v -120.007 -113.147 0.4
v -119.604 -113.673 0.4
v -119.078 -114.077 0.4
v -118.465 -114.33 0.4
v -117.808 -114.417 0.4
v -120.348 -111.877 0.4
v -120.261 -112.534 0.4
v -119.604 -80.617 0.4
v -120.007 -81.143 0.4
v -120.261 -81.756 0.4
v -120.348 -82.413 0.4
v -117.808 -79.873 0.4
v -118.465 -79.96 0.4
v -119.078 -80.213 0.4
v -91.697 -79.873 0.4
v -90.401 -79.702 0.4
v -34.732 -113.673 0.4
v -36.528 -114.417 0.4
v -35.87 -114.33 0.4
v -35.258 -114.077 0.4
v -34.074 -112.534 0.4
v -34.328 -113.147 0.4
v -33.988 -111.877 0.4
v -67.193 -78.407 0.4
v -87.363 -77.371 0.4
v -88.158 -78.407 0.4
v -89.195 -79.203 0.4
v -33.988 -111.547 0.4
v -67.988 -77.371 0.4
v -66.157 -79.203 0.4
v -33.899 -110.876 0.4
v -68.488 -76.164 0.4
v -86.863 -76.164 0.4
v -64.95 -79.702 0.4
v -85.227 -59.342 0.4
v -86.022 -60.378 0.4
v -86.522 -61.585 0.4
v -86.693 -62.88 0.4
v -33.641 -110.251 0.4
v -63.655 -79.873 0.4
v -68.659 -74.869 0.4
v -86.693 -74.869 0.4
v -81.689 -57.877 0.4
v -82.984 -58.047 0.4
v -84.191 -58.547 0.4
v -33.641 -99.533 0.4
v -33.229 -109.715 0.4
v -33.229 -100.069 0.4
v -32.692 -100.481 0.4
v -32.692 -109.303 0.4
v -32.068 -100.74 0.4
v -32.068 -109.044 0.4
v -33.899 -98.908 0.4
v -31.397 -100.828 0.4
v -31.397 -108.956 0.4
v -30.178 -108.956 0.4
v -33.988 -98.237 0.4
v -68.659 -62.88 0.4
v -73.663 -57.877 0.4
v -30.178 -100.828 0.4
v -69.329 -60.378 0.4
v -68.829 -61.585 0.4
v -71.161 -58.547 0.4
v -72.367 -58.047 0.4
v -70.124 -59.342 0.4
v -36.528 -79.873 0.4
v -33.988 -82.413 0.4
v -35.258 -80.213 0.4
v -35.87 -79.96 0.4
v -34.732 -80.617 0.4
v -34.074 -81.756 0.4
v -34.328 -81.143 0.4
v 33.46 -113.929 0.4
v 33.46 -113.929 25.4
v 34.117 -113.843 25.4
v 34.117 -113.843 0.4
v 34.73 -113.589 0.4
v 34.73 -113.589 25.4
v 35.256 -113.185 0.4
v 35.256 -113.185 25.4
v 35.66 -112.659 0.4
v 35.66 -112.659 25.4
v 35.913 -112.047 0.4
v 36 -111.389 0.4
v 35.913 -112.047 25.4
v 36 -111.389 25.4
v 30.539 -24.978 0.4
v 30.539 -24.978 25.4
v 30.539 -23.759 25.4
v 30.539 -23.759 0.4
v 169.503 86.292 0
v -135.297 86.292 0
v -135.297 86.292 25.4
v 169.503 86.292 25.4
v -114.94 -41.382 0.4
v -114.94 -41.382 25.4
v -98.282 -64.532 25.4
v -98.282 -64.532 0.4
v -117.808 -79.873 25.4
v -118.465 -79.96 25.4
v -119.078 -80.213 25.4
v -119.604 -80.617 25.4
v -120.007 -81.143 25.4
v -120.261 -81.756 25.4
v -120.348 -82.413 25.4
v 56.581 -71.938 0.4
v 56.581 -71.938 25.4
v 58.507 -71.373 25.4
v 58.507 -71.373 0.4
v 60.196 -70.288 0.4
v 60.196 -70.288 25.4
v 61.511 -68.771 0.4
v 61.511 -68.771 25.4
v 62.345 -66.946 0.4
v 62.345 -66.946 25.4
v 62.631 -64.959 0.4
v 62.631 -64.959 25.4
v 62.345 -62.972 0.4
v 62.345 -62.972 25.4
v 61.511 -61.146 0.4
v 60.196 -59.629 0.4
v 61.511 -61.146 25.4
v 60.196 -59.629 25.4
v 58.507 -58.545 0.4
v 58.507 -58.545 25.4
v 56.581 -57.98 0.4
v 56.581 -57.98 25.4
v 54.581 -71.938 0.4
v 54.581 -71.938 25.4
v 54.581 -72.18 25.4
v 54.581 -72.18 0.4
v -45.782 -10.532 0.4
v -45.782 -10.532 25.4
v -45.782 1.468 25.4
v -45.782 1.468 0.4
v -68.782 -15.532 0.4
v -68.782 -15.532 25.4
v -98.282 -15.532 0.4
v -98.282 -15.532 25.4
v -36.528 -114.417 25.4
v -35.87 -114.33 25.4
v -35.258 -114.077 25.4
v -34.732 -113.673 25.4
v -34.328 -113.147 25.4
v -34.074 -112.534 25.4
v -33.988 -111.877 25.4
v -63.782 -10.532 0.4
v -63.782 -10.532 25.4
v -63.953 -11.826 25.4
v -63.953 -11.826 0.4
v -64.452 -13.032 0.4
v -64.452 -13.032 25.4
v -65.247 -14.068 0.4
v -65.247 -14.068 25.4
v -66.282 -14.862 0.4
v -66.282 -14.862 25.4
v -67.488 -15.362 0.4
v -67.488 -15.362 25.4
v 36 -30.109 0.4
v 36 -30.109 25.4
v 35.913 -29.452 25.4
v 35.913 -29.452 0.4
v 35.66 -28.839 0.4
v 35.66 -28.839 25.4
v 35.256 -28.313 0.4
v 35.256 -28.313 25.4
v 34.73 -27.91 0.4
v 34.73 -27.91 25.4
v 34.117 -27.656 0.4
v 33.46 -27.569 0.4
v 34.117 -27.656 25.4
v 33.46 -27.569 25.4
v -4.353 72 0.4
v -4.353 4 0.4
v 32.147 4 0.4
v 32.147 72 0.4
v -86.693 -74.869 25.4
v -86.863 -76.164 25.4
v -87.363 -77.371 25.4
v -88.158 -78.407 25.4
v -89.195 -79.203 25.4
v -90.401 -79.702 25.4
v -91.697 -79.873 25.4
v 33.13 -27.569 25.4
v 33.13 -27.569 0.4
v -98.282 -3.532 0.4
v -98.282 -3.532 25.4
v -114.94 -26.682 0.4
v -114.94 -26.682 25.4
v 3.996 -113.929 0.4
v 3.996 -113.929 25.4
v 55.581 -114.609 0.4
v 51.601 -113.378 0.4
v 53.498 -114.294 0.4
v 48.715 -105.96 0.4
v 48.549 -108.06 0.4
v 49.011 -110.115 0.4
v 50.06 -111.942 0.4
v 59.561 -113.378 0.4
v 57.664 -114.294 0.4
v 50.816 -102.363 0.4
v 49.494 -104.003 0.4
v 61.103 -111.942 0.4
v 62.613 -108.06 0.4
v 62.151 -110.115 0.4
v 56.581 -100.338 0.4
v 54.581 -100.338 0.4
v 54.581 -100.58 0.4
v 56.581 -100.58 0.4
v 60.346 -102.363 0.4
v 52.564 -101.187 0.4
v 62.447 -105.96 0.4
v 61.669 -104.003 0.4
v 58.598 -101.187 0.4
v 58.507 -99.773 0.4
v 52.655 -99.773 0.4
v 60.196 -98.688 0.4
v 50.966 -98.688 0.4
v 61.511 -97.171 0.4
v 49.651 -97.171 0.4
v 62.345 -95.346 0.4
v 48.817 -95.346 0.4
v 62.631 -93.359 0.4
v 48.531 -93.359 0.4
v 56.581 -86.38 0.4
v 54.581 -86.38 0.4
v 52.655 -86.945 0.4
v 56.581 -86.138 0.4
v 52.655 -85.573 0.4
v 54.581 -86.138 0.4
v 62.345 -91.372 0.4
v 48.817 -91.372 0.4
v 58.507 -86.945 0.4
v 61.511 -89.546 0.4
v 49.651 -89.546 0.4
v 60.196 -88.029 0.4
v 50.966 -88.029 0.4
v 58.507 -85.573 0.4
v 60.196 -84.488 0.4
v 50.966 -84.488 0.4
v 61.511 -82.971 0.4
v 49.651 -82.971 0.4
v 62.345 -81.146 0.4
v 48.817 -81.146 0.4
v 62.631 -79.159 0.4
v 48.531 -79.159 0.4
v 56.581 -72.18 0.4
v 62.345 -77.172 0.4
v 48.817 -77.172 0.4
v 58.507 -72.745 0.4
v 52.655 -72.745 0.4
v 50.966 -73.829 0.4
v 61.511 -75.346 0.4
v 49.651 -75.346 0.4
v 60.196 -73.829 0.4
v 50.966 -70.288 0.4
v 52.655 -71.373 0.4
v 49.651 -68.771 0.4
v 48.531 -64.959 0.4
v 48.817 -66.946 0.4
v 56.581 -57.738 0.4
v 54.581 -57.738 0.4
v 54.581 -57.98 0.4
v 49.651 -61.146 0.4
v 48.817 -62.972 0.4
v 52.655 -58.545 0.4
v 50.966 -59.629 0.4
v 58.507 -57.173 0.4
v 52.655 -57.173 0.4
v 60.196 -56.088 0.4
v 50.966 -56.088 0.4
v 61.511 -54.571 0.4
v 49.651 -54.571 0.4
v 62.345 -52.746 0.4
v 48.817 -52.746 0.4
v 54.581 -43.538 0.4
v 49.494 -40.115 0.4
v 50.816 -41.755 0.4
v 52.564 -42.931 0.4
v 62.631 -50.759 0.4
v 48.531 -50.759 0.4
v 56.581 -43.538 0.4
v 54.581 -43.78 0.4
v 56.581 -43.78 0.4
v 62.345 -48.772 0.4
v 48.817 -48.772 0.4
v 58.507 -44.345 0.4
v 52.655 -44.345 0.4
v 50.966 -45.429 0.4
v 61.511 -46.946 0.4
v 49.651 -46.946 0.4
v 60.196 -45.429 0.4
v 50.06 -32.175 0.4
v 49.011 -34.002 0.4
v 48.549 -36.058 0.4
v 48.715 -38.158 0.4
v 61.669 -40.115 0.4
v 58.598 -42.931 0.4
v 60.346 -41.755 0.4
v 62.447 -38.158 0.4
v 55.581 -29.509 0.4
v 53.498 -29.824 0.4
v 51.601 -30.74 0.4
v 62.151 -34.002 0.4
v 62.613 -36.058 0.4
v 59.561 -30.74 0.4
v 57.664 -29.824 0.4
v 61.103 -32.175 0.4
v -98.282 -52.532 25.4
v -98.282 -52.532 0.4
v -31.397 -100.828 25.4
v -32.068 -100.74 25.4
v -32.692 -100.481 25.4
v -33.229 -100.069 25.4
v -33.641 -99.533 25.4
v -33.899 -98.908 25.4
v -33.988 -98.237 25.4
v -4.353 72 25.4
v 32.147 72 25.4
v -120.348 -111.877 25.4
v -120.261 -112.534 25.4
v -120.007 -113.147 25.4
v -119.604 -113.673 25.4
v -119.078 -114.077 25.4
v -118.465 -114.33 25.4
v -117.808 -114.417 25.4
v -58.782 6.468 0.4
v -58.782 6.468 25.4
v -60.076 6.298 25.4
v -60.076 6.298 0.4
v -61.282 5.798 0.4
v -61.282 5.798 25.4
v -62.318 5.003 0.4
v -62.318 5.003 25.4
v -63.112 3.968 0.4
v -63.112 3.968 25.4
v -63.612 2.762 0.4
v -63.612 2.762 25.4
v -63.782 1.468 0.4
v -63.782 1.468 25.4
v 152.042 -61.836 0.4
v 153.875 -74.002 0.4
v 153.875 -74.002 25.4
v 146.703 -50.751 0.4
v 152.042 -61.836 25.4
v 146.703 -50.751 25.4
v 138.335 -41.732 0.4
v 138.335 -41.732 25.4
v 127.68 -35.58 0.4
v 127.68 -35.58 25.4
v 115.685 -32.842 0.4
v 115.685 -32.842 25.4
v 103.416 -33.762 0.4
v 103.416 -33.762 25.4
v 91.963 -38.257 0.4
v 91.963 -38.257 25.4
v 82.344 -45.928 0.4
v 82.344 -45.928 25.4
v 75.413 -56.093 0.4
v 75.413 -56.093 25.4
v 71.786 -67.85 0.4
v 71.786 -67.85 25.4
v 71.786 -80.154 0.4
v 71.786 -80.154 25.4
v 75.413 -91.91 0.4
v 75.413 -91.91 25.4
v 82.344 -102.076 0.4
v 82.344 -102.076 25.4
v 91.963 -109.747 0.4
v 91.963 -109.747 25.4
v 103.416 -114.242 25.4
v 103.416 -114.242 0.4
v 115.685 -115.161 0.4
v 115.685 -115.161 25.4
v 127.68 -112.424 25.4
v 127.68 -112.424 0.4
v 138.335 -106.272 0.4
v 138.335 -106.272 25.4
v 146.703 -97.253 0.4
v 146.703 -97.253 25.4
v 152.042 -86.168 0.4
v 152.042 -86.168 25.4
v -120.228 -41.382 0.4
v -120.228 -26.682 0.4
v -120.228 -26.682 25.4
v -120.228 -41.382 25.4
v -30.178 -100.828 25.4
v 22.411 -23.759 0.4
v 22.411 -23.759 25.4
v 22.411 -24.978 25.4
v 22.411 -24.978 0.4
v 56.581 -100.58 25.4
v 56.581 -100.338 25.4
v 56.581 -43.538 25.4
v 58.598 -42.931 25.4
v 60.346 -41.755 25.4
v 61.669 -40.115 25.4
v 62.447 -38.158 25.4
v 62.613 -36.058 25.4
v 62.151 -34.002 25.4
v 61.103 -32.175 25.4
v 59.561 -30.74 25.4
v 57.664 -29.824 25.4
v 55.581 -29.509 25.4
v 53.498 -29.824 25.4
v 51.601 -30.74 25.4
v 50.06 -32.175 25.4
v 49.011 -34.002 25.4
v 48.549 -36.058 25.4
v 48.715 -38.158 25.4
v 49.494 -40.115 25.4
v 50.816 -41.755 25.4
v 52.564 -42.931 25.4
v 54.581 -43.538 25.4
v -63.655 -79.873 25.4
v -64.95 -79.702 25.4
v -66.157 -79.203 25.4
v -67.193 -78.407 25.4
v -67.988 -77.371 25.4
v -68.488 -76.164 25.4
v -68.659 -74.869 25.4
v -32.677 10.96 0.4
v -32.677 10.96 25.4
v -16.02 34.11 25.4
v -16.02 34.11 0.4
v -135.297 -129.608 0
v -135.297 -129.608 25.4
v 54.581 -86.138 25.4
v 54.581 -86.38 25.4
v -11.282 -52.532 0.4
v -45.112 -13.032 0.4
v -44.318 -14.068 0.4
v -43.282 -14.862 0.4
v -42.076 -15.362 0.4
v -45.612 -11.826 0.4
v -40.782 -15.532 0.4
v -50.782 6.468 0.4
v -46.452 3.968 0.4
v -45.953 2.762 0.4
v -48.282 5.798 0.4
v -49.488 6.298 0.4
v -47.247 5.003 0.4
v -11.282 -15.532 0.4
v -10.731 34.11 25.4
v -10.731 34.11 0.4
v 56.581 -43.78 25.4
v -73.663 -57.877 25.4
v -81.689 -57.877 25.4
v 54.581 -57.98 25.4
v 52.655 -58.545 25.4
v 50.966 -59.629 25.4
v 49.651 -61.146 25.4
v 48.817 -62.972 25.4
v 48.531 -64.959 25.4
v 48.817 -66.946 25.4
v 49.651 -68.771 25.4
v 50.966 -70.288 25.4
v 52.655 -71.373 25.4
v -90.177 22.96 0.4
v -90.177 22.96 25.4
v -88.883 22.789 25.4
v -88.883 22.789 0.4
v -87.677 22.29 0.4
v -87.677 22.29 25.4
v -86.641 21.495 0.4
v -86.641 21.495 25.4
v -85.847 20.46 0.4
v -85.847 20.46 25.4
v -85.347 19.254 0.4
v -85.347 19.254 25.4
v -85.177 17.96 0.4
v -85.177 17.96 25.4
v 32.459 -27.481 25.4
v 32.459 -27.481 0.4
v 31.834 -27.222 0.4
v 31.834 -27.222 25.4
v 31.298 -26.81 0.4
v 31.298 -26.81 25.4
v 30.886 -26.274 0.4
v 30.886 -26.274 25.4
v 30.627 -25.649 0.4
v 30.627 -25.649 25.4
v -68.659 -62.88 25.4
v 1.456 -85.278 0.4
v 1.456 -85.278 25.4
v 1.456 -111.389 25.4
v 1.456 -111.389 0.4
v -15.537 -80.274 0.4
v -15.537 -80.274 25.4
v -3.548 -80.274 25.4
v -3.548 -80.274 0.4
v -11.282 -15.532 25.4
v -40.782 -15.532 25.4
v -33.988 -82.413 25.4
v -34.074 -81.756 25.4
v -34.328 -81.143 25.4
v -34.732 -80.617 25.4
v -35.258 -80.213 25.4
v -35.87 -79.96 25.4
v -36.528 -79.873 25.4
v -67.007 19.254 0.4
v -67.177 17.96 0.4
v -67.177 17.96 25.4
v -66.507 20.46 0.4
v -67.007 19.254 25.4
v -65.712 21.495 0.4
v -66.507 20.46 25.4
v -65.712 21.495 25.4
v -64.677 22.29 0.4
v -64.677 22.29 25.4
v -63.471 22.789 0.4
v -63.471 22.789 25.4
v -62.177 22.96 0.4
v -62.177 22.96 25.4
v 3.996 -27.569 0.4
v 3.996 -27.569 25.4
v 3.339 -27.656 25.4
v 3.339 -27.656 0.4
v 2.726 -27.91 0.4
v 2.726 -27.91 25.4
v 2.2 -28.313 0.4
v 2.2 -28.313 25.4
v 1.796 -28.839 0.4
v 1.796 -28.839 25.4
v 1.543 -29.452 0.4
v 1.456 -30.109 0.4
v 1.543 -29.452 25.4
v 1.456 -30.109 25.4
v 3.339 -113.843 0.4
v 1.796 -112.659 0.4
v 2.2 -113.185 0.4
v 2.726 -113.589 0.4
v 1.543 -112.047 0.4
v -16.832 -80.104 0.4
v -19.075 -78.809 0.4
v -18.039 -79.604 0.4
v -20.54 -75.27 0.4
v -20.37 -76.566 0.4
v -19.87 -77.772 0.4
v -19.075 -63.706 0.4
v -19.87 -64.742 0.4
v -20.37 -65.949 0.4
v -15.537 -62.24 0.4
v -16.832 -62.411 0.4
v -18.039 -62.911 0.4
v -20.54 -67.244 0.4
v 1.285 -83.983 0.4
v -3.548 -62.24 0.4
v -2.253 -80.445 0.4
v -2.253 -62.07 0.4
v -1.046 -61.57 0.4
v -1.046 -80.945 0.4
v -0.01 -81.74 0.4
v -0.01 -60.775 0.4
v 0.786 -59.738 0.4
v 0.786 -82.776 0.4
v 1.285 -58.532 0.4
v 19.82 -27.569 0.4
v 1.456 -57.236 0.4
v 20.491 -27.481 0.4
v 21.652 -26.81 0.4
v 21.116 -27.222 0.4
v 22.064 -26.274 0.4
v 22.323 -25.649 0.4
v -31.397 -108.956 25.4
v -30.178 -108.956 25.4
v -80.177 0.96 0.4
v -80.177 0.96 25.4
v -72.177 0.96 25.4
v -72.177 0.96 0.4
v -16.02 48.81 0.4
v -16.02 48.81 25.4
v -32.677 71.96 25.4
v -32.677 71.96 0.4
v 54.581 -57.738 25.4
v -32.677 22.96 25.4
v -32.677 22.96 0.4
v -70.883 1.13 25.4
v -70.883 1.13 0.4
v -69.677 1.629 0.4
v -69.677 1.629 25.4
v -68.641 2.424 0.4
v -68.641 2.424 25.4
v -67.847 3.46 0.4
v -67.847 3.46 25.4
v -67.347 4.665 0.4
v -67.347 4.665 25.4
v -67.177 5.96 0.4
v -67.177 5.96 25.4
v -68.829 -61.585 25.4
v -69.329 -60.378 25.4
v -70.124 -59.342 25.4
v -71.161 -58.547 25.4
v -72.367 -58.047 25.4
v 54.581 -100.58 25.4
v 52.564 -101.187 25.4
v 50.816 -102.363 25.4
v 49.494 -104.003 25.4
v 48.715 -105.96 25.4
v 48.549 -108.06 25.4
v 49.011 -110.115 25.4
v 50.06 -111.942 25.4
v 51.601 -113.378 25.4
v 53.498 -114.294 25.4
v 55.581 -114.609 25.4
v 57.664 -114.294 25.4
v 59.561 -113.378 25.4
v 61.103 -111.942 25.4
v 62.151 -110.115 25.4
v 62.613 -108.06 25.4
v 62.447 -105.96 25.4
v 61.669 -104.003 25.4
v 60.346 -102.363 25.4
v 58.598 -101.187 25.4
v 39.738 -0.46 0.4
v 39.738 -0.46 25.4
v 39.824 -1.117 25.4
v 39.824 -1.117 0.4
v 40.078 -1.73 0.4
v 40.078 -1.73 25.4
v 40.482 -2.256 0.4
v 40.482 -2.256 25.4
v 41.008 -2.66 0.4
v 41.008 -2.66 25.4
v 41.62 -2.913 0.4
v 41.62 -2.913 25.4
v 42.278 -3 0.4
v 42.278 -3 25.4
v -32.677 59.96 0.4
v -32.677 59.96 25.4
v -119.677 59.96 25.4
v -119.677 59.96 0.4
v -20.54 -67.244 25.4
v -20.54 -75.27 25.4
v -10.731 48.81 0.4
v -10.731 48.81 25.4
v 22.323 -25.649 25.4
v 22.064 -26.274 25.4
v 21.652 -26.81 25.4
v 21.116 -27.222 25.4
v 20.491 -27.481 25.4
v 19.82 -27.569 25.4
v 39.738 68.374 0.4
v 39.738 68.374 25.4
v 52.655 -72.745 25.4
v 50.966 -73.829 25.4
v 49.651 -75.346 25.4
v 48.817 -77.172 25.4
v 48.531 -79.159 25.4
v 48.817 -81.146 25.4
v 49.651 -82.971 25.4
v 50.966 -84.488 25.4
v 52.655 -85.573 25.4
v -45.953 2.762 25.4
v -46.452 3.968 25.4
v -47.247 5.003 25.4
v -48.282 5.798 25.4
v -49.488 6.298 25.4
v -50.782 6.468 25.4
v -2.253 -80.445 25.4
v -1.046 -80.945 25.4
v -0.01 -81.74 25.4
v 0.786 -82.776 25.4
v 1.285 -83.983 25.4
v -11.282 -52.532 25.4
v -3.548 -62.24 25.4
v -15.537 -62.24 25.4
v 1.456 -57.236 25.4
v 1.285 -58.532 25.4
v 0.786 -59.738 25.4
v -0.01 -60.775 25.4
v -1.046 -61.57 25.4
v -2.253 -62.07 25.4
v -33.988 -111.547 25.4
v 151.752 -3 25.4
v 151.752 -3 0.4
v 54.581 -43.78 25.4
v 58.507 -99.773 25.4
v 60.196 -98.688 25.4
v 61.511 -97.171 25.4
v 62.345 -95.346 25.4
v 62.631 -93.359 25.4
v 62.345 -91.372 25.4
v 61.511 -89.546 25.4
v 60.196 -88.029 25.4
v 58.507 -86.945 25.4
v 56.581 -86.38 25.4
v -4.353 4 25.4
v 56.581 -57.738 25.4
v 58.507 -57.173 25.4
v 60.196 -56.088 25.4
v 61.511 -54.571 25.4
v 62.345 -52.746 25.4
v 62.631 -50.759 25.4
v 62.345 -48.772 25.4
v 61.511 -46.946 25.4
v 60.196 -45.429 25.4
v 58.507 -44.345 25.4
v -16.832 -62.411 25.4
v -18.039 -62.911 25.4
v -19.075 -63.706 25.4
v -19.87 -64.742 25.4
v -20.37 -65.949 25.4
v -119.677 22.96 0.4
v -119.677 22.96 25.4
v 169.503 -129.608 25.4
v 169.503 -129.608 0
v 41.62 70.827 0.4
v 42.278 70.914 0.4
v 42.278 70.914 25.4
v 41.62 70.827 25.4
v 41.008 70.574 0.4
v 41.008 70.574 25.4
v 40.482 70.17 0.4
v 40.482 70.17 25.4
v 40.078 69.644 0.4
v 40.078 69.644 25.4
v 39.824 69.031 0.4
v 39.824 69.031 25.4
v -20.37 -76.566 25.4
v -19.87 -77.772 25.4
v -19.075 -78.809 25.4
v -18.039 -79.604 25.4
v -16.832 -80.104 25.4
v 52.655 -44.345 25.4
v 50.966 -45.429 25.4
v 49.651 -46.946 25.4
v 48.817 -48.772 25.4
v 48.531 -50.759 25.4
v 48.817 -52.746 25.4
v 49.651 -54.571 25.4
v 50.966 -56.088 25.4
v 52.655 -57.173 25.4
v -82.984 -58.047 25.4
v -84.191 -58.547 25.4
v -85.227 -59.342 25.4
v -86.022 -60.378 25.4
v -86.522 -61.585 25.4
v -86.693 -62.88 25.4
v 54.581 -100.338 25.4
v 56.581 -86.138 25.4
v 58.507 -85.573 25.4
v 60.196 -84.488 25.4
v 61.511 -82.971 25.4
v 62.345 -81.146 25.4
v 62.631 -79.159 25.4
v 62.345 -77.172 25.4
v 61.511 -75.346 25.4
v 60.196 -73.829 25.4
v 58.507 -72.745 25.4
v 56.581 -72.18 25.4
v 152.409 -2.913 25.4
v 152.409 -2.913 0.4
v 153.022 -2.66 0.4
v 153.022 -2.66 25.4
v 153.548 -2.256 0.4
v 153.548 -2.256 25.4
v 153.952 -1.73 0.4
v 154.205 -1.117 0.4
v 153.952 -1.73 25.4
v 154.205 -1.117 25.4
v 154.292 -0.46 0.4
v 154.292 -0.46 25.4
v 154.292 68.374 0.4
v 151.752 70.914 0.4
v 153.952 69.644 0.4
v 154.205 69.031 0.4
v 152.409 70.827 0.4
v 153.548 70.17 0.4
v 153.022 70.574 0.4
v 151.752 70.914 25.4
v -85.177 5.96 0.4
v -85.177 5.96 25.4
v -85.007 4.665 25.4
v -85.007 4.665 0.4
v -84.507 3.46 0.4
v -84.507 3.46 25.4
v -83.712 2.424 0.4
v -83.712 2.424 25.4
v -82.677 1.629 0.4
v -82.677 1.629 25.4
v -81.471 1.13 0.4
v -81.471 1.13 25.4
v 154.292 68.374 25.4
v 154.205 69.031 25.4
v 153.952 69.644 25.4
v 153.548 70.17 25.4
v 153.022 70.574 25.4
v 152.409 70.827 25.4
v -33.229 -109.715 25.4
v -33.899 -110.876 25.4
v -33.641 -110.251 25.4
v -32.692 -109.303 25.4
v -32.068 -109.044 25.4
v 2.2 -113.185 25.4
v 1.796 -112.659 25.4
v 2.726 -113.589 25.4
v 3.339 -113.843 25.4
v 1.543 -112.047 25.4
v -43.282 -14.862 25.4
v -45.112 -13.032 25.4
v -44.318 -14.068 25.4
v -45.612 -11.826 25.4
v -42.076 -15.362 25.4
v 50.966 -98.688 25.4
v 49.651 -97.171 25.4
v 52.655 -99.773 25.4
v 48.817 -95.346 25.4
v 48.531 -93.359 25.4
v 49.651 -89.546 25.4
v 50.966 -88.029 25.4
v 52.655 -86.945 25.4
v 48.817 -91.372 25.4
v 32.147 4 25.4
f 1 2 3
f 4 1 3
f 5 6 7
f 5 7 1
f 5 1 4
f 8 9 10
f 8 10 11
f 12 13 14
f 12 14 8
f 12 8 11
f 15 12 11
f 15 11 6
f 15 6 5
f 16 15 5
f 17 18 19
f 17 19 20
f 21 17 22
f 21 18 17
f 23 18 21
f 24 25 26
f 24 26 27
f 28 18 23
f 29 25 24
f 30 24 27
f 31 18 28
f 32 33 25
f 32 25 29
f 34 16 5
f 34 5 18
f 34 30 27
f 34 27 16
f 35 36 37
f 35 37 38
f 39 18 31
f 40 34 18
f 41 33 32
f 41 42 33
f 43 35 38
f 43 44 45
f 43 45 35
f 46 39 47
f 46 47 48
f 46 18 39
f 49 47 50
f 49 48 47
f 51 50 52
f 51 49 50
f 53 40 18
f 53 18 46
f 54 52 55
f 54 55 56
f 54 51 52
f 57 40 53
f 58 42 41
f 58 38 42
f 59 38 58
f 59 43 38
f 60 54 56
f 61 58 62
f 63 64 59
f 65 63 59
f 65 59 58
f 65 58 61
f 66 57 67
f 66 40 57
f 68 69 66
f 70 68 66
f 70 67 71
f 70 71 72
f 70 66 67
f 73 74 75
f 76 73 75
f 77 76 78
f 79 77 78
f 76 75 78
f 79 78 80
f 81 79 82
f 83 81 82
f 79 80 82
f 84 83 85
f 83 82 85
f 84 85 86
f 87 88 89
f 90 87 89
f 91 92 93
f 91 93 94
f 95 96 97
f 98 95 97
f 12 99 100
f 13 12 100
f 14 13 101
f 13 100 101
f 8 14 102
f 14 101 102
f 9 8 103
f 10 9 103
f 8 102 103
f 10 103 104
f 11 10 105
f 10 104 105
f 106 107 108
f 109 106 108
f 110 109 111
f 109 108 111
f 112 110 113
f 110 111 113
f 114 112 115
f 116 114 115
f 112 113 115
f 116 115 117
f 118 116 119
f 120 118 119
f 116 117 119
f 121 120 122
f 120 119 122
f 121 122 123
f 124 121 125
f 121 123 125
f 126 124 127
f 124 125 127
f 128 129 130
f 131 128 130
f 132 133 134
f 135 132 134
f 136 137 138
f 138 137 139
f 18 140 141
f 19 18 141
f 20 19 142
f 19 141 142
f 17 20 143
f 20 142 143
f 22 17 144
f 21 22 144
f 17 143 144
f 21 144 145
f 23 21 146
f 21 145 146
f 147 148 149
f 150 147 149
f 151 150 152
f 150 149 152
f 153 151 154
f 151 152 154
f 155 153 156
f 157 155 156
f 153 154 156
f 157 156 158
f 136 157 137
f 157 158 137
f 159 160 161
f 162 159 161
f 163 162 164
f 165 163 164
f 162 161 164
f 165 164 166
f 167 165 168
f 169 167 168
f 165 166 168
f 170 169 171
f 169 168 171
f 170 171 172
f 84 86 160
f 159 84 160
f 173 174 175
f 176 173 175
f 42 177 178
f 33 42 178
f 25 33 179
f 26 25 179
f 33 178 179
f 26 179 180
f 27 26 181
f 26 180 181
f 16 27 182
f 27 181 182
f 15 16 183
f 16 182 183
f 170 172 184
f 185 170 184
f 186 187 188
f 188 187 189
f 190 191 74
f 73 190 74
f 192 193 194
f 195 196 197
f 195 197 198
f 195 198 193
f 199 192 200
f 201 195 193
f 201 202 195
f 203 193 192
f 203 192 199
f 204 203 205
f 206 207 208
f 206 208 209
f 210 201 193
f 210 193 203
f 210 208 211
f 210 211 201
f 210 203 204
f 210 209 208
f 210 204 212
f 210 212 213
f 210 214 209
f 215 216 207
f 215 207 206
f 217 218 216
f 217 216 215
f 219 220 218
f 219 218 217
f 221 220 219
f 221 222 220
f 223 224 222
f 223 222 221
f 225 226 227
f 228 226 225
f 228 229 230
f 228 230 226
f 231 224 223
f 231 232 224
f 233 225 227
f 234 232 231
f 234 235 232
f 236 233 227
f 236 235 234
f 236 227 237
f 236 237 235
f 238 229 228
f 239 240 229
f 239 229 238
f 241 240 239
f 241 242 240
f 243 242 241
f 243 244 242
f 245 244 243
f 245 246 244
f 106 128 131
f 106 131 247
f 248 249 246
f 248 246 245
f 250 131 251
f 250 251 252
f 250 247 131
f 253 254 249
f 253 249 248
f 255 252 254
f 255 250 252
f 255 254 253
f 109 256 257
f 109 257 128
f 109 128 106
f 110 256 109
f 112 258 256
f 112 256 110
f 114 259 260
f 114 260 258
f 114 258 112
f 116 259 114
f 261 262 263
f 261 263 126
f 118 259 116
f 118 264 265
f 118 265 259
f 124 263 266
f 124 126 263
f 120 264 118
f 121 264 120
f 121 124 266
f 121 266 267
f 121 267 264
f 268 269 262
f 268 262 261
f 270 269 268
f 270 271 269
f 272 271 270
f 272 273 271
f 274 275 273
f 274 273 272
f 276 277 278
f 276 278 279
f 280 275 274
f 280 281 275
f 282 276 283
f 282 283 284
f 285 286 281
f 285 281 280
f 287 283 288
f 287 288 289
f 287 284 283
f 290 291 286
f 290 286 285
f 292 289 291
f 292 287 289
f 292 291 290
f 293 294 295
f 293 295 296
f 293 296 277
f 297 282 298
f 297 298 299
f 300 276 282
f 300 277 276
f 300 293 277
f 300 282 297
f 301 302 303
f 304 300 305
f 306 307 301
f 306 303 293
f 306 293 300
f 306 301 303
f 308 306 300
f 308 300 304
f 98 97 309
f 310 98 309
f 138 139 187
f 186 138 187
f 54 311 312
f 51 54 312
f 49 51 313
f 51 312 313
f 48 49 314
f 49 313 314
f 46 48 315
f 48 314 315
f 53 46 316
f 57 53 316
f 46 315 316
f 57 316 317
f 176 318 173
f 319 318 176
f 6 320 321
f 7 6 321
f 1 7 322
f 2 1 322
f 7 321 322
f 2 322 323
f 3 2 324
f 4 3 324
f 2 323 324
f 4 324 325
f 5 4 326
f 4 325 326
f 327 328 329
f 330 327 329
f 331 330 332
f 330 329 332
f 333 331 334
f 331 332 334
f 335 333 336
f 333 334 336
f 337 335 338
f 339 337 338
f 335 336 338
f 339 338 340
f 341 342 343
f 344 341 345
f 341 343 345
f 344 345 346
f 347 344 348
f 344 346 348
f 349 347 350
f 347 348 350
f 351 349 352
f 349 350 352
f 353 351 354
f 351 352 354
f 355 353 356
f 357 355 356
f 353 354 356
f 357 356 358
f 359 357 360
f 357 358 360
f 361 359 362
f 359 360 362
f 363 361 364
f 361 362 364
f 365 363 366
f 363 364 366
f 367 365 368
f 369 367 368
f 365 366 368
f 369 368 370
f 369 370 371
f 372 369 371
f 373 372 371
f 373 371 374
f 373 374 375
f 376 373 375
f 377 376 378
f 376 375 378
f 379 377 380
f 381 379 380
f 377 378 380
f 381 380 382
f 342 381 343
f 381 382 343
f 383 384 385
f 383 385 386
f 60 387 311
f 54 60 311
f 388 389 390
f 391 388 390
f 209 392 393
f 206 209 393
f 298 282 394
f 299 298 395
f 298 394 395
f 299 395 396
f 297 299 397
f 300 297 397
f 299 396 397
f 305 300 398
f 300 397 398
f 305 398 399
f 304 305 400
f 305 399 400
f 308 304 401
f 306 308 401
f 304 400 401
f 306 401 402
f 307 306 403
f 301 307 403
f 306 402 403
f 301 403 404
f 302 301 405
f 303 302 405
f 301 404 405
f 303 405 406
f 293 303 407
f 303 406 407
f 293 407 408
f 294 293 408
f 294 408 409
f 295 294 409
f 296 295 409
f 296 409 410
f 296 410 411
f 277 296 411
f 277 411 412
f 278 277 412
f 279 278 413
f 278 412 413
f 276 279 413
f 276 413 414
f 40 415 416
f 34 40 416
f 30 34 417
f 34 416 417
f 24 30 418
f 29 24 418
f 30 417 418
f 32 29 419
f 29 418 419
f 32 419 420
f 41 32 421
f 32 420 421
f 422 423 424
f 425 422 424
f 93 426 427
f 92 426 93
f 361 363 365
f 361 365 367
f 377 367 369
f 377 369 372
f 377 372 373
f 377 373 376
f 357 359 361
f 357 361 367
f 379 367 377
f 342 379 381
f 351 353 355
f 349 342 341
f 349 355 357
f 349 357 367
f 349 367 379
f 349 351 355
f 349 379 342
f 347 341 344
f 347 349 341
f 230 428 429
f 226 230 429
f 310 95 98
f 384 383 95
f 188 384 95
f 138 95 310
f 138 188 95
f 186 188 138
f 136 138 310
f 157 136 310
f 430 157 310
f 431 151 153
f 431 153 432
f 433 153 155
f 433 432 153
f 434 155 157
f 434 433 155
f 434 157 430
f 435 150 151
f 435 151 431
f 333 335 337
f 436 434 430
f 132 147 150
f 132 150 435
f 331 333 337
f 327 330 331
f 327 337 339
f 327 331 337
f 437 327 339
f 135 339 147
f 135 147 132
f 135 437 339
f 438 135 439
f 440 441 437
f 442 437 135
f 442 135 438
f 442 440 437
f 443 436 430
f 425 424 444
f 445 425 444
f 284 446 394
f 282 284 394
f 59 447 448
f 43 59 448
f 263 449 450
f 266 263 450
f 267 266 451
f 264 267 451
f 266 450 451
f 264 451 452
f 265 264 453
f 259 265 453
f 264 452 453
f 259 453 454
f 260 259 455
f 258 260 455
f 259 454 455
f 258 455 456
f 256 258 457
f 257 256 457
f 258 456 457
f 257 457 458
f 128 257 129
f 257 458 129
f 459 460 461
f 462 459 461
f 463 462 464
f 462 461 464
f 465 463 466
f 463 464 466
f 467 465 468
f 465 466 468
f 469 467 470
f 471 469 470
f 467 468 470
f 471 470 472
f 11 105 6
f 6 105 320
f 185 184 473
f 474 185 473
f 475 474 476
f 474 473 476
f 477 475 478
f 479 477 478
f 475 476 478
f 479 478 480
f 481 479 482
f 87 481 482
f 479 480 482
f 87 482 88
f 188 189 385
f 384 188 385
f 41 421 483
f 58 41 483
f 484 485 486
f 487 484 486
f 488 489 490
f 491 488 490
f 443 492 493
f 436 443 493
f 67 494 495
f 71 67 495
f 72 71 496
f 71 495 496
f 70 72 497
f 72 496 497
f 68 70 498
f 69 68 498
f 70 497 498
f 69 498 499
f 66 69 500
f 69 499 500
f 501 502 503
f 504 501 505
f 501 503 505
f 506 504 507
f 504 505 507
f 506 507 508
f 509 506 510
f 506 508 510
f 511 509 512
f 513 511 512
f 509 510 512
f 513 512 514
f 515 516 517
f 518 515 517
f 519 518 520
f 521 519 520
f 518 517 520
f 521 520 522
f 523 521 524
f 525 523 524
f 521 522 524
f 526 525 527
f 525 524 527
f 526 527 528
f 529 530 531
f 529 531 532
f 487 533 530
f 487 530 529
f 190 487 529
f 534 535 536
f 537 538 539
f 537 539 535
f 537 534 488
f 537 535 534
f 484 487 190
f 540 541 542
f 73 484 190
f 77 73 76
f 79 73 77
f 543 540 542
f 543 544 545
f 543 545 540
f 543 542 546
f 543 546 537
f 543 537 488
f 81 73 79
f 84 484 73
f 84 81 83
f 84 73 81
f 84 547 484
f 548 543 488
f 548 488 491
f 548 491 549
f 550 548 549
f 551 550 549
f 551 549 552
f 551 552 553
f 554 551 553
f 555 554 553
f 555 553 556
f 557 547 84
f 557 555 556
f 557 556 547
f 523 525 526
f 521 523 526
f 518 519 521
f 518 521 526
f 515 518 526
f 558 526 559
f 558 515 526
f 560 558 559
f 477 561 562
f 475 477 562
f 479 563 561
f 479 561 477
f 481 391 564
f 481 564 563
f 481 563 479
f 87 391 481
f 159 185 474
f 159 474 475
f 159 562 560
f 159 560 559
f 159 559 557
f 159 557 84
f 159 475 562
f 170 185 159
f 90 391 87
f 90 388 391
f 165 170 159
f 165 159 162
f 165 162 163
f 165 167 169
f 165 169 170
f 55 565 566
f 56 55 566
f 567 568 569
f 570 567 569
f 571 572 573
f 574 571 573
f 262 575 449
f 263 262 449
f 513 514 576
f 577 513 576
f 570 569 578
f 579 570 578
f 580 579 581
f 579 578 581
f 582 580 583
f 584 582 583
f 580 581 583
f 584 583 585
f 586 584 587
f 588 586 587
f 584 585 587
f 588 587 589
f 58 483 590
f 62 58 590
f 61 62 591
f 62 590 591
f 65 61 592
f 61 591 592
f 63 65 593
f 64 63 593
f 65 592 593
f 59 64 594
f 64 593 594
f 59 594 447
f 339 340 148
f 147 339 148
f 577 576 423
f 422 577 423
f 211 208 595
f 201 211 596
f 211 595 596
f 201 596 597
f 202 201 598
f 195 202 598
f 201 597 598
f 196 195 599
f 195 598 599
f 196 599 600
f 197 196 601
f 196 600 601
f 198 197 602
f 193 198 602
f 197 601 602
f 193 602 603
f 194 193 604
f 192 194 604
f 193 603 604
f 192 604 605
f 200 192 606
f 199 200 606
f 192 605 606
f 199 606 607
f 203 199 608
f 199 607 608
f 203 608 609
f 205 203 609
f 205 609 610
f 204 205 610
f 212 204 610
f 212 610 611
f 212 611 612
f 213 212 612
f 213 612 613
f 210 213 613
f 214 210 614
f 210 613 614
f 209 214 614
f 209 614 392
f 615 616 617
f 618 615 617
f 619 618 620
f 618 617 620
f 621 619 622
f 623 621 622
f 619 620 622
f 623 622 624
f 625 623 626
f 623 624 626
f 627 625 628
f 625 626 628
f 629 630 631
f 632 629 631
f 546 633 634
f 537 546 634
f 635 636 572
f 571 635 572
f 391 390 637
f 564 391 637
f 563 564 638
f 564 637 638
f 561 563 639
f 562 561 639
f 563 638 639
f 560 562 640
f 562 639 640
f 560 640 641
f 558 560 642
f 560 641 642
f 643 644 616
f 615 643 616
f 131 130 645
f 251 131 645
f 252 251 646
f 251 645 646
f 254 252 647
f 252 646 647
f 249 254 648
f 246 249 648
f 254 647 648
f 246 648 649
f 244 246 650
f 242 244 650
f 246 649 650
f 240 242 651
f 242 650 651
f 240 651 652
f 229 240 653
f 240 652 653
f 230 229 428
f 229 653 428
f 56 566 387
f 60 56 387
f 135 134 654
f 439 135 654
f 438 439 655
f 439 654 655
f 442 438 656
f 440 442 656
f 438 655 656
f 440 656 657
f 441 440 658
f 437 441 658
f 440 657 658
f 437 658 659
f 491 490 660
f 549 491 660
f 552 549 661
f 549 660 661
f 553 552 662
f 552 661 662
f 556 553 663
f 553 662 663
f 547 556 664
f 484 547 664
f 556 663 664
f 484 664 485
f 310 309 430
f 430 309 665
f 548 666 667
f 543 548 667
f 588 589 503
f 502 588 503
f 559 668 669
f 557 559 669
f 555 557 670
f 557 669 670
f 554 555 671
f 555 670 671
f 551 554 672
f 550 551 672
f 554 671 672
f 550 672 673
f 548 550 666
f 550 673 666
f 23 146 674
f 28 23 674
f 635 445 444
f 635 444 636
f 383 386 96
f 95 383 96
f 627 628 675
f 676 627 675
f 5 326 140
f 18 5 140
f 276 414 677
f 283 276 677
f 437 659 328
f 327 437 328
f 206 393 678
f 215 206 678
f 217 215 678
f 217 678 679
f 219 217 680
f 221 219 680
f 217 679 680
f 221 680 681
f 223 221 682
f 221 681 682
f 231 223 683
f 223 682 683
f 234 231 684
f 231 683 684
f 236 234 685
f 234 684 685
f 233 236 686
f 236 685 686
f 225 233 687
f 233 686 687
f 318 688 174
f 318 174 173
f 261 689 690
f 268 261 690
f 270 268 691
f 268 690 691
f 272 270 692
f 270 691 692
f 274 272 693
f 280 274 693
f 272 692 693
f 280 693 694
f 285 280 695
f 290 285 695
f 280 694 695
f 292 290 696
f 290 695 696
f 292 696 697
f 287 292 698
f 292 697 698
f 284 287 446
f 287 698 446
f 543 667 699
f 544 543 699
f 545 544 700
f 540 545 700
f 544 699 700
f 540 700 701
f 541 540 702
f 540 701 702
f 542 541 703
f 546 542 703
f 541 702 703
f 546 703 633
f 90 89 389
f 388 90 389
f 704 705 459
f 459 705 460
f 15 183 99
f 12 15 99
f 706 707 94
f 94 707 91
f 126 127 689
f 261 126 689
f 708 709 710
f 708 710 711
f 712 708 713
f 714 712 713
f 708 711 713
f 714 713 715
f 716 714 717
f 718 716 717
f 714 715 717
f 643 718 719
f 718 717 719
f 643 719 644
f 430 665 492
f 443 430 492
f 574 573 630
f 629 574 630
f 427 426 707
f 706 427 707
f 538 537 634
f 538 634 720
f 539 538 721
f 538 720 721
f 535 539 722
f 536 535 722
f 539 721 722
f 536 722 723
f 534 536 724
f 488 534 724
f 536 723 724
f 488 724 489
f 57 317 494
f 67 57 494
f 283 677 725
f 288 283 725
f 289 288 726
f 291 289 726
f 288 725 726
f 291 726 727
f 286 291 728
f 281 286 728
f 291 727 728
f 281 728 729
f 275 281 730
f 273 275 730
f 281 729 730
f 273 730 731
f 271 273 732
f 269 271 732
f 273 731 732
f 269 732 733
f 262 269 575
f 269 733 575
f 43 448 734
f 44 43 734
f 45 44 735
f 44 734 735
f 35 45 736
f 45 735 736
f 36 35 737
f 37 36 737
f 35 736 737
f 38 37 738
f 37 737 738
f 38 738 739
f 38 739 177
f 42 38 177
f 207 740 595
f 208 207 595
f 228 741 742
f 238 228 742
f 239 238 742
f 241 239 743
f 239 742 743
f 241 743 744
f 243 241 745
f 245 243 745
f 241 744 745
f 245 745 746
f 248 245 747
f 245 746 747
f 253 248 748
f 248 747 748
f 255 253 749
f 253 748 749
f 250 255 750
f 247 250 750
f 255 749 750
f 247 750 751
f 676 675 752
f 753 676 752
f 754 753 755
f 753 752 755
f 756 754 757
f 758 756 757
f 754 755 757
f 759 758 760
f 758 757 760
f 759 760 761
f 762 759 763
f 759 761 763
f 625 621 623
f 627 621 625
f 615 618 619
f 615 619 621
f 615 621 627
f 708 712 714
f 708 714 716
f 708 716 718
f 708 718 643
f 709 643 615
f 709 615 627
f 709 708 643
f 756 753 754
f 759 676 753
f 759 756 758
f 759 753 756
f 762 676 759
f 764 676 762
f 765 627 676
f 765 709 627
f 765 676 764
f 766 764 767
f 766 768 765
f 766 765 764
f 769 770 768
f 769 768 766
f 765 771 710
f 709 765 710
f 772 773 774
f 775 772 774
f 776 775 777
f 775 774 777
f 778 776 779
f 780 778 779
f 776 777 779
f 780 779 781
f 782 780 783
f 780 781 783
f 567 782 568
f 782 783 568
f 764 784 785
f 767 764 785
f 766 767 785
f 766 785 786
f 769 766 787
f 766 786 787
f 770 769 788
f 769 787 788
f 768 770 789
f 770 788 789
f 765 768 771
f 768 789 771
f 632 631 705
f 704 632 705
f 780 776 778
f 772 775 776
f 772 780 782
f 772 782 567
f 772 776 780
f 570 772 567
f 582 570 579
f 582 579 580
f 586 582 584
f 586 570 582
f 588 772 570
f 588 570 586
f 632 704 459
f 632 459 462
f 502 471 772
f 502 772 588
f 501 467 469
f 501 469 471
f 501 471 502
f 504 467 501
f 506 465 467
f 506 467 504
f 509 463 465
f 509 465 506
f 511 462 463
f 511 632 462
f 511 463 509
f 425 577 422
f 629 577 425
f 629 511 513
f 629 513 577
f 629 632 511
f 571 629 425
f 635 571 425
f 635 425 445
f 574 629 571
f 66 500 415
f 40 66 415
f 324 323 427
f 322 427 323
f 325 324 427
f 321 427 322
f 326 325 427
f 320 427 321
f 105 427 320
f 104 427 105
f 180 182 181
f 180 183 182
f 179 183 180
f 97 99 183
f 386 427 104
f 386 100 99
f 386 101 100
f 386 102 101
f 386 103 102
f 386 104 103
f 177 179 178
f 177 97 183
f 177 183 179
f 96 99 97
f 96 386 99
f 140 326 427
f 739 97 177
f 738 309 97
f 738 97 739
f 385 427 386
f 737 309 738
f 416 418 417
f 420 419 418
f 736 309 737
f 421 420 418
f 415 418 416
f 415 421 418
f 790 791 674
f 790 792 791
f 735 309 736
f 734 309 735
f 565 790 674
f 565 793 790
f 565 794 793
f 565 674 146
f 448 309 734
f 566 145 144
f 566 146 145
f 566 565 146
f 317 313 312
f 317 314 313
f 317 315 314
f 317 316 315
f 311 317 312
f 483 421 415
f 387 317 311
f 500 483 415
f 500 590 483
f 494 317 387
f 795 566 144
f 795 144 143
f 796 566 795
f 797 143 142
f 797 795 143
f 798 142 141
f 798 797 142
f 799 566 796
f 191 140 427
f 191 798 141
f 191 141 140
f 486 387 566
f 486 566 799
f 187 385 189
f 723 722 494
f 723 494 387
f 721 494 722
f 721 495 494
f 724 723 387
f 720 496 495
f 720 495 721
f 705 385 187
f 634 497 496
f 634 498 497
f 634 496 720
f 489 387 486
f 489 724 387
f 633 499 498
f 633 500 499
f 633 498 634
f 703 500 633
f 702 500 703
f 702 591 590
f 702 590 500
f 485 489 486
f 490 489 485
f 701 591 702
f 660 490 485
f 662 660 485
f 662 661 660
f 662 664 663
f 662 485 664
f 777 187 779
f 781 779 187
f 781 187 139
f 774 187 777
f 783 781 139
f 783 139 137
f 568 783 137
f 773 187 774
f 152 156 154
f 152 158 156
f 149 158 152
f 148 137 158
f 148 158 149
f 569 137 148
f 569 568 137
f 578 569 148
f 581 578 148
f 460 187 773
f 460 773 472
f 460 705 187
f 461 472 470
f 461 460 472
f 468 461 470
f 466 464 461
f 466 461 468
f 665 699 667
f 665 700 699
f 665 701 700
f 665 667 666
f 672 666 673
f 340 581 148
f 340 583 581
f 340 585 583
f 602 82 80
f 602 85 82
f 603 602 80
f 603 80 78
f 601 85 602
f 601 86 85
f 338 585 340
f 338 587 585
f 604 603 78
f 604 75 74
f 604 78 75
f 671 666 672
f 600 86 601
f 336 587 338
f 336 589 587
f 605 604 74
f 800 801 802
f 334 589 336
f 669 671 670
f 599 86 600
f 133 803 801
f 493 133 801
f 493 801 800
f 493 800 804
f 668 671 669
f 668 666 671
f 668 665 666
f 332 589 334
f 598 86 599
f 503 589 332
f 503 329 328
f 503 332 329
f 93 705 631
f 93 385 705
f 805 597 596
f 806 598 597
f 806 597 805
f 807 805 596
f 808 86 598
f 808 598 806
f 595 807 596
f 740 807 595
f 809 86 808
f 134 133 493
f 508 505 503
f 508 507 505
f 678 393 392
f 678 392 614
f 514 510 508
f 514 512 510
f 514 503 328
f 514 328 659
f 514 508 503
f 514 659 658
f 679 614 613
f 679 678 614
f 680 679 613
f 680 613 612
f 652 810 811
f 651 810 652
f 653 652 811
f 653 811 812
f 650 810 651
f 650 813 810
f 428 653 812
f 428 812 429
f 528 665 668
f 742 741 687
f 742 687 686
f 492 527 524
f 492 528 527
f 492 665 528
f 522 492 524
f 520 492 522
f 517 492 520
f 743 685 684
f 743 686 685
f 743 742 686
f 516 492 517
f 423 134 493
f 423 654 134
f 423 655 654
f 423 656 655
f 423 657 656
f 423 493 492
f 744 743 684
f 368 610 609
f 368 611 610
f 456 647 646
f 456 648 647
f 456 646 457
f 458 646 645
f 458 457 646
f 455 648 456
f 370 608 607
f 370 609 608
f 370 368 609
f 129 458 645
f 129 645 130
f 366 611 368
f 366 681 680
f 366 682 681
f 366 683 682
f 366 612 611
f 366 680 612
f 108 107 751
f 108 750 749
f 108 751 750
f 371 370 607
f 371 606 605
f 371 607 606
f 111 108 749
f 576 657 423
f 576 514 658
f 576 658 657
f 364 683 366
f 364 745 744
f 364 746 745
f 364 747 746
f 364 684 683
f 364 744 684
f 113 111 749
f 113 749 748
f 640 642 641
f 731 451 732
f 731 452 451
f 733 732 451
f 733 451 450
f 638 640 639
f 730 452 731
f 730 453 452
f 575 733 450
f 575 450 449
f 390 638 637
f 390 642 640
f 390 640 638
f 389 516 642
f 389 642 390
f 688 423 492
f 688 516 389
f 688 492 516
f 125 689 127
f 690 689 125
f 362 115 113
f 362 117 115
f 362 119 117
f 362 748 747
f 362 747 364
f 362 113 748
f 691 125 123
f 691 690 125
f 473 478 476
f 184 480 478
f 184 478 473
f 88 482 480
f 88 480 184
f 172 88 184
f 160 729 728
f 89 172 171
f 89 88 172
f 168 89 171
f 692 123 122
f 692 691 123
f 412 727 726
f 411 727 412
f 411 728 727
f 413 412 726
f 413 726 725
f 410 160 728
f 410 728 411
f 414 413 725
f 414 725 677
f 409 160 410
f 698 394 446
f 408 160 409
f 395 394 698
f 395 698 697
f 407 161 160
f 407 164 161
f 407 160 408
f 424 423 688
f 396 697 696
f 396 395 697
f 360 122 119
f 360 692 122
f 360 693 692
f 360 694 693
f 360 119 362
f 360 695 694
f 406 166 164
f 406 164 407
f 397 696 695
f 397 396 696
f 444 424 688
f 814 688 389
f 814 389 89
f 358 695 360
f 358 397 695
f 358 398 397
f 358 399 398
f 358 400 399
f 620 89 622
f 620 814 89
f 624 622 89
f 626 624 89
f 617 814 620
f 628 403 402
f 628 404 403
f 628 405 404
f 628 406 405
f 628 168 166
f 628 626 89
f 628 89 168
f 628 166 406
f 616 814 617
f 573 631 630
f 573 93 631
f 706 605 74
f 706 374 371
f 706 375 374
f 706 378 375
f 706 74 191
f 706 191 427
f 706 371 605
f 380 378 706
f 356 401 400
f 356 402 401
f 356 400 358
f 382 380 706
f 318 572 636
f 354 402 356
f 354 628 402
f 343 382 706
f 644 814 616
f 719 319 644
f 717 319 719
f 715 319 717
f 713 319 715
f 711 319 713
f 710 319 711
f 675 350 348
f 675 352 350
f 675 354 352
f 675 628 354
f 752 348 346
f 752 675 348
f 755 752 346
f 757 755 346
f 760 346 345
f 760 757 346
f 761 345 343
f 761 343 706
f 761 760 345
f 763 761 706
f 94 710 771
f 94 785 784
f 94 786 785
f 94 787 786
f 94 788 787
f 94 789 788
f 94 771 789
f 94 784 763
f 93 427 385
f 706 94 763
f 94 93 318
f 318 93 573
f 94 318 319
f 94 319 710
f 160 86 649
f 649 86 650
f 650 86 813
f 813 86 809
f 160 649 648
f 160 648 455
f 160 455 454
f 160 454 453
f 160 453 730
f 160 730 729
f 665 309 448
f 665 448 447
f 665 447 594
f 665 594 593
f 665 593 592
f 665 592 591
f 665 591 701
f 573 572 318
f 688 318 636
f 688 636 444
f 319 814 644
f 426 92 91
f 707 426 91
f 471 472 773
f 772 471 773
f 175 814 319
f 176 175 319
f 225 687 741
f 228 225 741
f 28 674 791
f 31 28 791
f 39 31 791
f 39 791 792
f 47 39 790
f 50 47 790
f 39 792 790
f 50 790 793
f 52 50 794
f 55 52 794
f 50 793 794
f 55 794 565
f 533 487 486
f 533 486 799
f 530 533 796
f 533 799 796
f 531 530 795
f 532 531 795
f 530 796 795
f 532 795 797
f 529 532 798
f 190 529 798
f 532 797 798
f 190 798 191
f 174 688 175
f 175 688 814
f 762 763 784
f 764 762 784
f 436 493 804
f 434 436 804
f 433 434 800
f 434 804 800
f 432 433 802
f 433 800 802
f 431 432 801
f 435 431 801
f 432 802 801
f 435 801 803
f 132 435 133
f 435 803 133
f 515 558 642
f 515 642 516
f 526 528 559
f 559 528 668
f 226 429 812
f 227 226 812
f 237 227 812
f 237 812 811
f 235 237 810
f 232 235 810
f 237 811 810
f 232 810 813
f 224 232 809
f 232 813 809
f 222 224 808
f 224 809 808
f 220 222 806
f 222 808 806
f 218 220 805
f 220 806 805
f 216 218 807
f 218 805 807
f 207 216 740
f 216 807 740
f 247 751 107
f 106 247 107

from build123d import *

# Parameters (mm, degrees)
F0_W      = 304.8
F0_H      = 215.9
F1_DEPTH  = 25.4
F5_R      = 41.275
F8_W      = 36.5
F8_H      = 68
F10_DEPTH = 25


with BuildPart() as f1:
    # F0 (on Top) → F1 (new body)
    with BuildSketch(Plane.XY):
        with Locations((17.103421, -21.658359)):
            Rectangle(F0_W, F0_H)
    extrude(amount=F1_DEPTH)

    # F0 (on Top) + F2 (on face) + F3 (on face) + F4 (on face) + F5 (on face) + F6 (on face) + F7 (on face) + F8 (on face) + F9 (on face) → F10 (cut)
    with BuildSketch(Plane.XY):
        with Locations((17.103421, -21.658359)):
            Rectangle(F0_W, F0_H)
    with BuildSketch(Plane.XY.offset(25.4)):
        with BuildLine():
            Line((1.455991, -85.278079), (1.455991, -111.389279))
            ThreePointArc((1.455991, -111.389279), (2.19994, -113.18533), (3.995991, -113.929279))
            Line((3.995991, -113.929279), (33.459991, -113.929279))
            ThreePointArc((33.459991, -113.929279), (35.256042, -113.18533), (35.999991, -111.389279))
            Line((35.999991, -111.389279), (35.999991, -30.109279))
            ThreePointArc((35.999991, -30.109279), (35.256042, -28.313228), (33.459991, -27.569279))
            Line((33.459991, -27.569279), (33.129791, -27.569279))
            ThreePointArc((33.129791, -27.569279), (31.297819, -26.810451), (30.538991, -24.978479))
            Line((30.538991, -24.978479), (30.538991, -23.759279))
            Line((30.538991, -23.759279), (22.410991, -23.759279))
            Line((22.410991, -23.759279), (22.410991, -24.978479))
            ThreePointArc((22.410991, -24.978479), (21.652163, -26.810451), (19.820191, -27.569279))
            Line((19.820191, -27.569279), (3.995991, -27.569279))
            ThreePointArc((3.995991, -27.569279), (2.19994, -28.313228), (1.455991, -30.109279))
            Line((1.455991, -30.109279), (1.455991, -57.236479))
            ThreePointArc((1.455991, -57.236479), (-0.009588, -60.7747), (-3.547809, -62.240279))
            Line((-3.547809, -62.240279), (-15.536609, -62.240279))
            ThreePointArc((-15.536609, -62.240279), (-19.07483, -63.705858), (-20.540409, -67.244079))
            Line((-20.540409, -67.244079), (-20.540409, -75.270479))
            ThreePointArc((-20.540409, -75.270479), (-19.07483, -78.8087), (-15.536609, -80.274279))
            Line((-15.536609, -80.274279), (-3.547809, -80.274279))
            ThreePointArc((-3.547809, -80.274279), (-0.009588, -81.739858), (1.455991, -85.278079))
        make_face()
    with BuildSketch(Plane.XY.offset(25.4)):
        with BuildLine():
            Line((-98.282373, -52.532049), (-11.282373, -52.532049))
            Line((-11.282373, -52.532049), (-11.282373, -15.532049))
            Line((-11.282373, -15.532049), (-40.782373, -15.532049))
            ThreePointArc((-40.782373, -15.532049), (-44.317906, -14.067583), (-45.782373, -10.532049))
            Line((-45.782373, -10.532049), (-45.782373, 1.467951))
            ThreePointArc((-45.782373, 1.467951), (-47.246839, 5.003485), (-50.782373, 6.467951))
            Line((-50.782373, 6.467951), (-58.782373, 6.467951))
            ThreePointArc((-58.782373, 6.467951), (-62.317906, 5.003485), (-63.782373, 1.467951))
            Line((-63.782373, 1.467951), (-63.782373, -10.532049))
            ThreePointArc((-63.782373, -10.532049), (-65.246839, -14.067583), (-68.782373, -15.532049))
            Line((-68.782373, -15.532049), (-98.282373, -15.532049))
            Line((-98.282373, -15.532049), (-98.282373, -3.532049))
            Line((-98.282373, -3.532049), (-114.939746, -26.682049))
            Line((-114.939746, -26.682049), (-120.228373, -26.682049))
            Line((-120.228373, -26.682049), (-120.228373, -34.032049))
            Line((-120.228373, -34.032049), (-120.228373, -41.382049))
            Line((-120.228373, -41.382049), (-114.939746, -41.382049))
            Line((-114.939746, -41.382049), (-98.282373, -64.532049))
            Line((-98.282373, -64.532049), (-98.282373, -52.532049))
        make_face()
    with BuildSketch(Plane.XY.offset(25.4)):
        with BuildLine():
            Line((151.751869, 70.914), (42.277869, 70.914))
            ThreePointArc((42.277869, 70.914), (40.481818, 70.170051), (39.737869, 68.374))
            Line((39.737869, 68.374), (39.737869, -0.46))
            ThreePointArc((39.737869, -0.46), (40.481818, -2.256051), (42.277869, -3))
            Line((42.277869, -3), (151.751869, -3))
            ThreePointArc((151.751869, -3), (153.54792, -2.256051), (154.291869, -0.46))
            Line((154.291869, -0.46), (154.291869, 68.374))
            ThreePointArc((154.291869, 68.374), (153.54792, 70.170051), (151.751869, 70.914))
        make_face()
    with BuildSketch(Plane.XY.offset(25.4)):
        with Locations((112.600401, -74.001856)):
            Circle(F5_R)
    with BuildSketch(Plane.XY.offset(25.4)):
        with BuildLine():
            Line((-91.696568, -79.872966), (-117.807768, -79.872966))
            ThreePointArc((-117.807768, -79.872966), (-119.603819, -80.616915), (-120.347768, -82.412966))
            Line((-120.347768, -82.412966), (-120.347768, -111.876966))
            ThreePointArc((-120.347768, -111.876966), (-119.603819, -113.673017), (-117.807768, -114.416966))
            Line((-117.807768, -114.416966), (-36.527768, -114.416966))
            ThreePointArc((-36.527768, -114.416966), (-34.731717, -113.673017), (-33.987768, -111.876966))
            Line((-33.987768, -111.876966), (-33.987768, -111.546766))
            ThreePointArc((-33.987768, -111.546766), (-33.22894, -109.714794), (-31.396968, -108.955966))
            Line((-31.396968, -108.955966), (-30.177768, -108.955966))
            Line((-30.177768, -108.955966), (-30.177768, -100.827966))
            Line((-30.177768, -100.827966), (-31.396968, -100.827966))
            ThreePointArc((-31.396968, -100.827966), (-33.22894, -100.069138), (-33.987768, -98.237166))
            Line((-33.987768, -98.237166), (-33.987768, -82.412966))
            ThreePointArc((-33.987768, -82.412966), (-34.731717, -80.616915), (-36.527768, -79.872966))
            Line((-36.527768, -79.872966), (-63.654968, -79.872966))
            ThreePointArc((-63.654968, -79.872966), (-67.193189, -78.407387), (-68.658768, -74.869166))
            Line((-68.658768, -74.869166), (-68.658768, -62.880366))
            ThreePointArc((-68.658768, -62.880366), (-70.124347, -59.342145), (-73.662568, -57.876566))
            Line((-73.662568, -57.876566), (-81.688968, -57.876566))
            ThreePointArc((-81.688968, -57.876566), (-85.227189, -59.342145), (-86.692768, -62.880366))
            Line((-86.692768, -62.880366), (-86.692768, -74.869166))
            ThreePointArc((-86.692768, -74.869166), (-88.158347, -78.407387), (-91.696568, -79.872966))
        make_face()
    with BuildSketch(Plane.XY.offset(25.4)):
        with BuildLine():
            Line((56.581123, -43.780106), (56.581123, -43.537542))
            ThreePointArc((56.581123, -43.537542), (55.581123, -29.508824), (54.581123, -43.537542))
            Line((54.581123, -43.537542), (54.581123, -43.780106))
            ThreePointArc((54.581123, -43.780106), (48.531123, -50.758824), (54.581123, -57.737542))
            Line((54.581123, -57.737542), (54.581123, -57.980106))
            ThreePointArc((54.581123, -57.980106), (48.531123, -64.958824), (54.581123, -71.937542))
            Line((54.581123, -71.937542), (54.581123, -72.180106))
            ThreePointArc((54.581123, -72.180106), (48.531123, -79.158824), (54.581123, -86.137542))
            Line((54.581123, -86.137542), (54.581123, -86.380106))
            ThreePointArc((54.581123, -86.380106), (48.531123, -93.358824), (54.581123, -100.337542))
            Line((54.581123, -100.337542), (54.581123, -100.580106))
            ThreePointArc((54.581123, -100.580106), (55.581123, -114.608824), (56.581123, -100.580106))
            Line((56.581123, -100.580106), (56.581123, -100.337542))
            ThreePointArc((56.581123, -100.337542), (62.631123, -93.358824), (56.581123, -86.380106))
            Line((56.581123, -86.380106), (56.581123, -86.137542))
            ThreePointArc((56.581123, -86.137542), (62.631123, -79.158824), (56.581123, -72.180106))
            Line((56.581123, -72.180106), (56.581123, -71.937542))
            ThreePointArc((56.581123, -71.937542), (62.631123, -64.958824), (56.581123, -57.980106))
            Line((56.581123, -57.980106), (56.581123, -57.737542))
            ThreePointArc((56.581123, -57.737542), (62.631123, -50.758824), (56.581123, -43.780106))
        make_face()
    with BuildSketch(Plane.XY.offset(25.4)):
        with Locations((13.897042, 38)):
            Rectangle(F8_W, F8_H)
    with BuildSketch(Plane.XY.offset(25.4)):
        with BuildLine():
            Line((-32.676903, 59.959536), (-119.676903, 59.959536))
            Line((-119.676903, 59.959536), (-119.676903, 22.959536))
            Line((-119.676903, 22.959536), (-90.176903, 22.959536))
            ThreePointArc((-90.176903, 22.959536), (-86.641369, 21.49507), (-85.176903, 17.959536))
            Line((-85.176903, 17.959536), (-85.176903, 5.959536))
            ThreePointArc((-85.176903, 5.959536), (-83.712437, 2.424002), (-80.176903, 0.959536))
            Line((-80.176903, 0.959536), (-72.176903, 0.959536))
            ThreePointArc((-72.176903, 0.959536), (-68.641369, 2.424002), (-67.176903, 5.959536))
            Line((-67.176903, 5.959536), (-67.176903, 17.959536))
            ThreePointArc((-67.176903, 17.959536), (-65.712437, 21.49507), (-62.176903, 22.959536))
            Line((-62.176903, 22.959536), (-32.676903, 22.959536))
            Line((-32.676903, 22.959536), (-32.676903, 10.959536))
            Line((-32.676903, 10.959536), (-16.019529, 34.109536))
            Line((-16.019529, 34.109536), (-10.730903, 34.109536))
            Line((-10.730903, 34.109536), (-10.730903, 41.459536))
            Line((-10.730903, 41.459536), (-10.730903, 48.809536))
            Line((-10.730903, 48.809536), (-16.019529, 48.809536))
            Line((-16.019529, 48.809536), (-32.676903, 71.959536))
            Line((-32.676903, 71.959536), (-32.676903, 59.959536))
        make_face()
    extrude(amount=-F10_DEPTH, mode=Mode.SUBTRACT)


solid = f1.part
